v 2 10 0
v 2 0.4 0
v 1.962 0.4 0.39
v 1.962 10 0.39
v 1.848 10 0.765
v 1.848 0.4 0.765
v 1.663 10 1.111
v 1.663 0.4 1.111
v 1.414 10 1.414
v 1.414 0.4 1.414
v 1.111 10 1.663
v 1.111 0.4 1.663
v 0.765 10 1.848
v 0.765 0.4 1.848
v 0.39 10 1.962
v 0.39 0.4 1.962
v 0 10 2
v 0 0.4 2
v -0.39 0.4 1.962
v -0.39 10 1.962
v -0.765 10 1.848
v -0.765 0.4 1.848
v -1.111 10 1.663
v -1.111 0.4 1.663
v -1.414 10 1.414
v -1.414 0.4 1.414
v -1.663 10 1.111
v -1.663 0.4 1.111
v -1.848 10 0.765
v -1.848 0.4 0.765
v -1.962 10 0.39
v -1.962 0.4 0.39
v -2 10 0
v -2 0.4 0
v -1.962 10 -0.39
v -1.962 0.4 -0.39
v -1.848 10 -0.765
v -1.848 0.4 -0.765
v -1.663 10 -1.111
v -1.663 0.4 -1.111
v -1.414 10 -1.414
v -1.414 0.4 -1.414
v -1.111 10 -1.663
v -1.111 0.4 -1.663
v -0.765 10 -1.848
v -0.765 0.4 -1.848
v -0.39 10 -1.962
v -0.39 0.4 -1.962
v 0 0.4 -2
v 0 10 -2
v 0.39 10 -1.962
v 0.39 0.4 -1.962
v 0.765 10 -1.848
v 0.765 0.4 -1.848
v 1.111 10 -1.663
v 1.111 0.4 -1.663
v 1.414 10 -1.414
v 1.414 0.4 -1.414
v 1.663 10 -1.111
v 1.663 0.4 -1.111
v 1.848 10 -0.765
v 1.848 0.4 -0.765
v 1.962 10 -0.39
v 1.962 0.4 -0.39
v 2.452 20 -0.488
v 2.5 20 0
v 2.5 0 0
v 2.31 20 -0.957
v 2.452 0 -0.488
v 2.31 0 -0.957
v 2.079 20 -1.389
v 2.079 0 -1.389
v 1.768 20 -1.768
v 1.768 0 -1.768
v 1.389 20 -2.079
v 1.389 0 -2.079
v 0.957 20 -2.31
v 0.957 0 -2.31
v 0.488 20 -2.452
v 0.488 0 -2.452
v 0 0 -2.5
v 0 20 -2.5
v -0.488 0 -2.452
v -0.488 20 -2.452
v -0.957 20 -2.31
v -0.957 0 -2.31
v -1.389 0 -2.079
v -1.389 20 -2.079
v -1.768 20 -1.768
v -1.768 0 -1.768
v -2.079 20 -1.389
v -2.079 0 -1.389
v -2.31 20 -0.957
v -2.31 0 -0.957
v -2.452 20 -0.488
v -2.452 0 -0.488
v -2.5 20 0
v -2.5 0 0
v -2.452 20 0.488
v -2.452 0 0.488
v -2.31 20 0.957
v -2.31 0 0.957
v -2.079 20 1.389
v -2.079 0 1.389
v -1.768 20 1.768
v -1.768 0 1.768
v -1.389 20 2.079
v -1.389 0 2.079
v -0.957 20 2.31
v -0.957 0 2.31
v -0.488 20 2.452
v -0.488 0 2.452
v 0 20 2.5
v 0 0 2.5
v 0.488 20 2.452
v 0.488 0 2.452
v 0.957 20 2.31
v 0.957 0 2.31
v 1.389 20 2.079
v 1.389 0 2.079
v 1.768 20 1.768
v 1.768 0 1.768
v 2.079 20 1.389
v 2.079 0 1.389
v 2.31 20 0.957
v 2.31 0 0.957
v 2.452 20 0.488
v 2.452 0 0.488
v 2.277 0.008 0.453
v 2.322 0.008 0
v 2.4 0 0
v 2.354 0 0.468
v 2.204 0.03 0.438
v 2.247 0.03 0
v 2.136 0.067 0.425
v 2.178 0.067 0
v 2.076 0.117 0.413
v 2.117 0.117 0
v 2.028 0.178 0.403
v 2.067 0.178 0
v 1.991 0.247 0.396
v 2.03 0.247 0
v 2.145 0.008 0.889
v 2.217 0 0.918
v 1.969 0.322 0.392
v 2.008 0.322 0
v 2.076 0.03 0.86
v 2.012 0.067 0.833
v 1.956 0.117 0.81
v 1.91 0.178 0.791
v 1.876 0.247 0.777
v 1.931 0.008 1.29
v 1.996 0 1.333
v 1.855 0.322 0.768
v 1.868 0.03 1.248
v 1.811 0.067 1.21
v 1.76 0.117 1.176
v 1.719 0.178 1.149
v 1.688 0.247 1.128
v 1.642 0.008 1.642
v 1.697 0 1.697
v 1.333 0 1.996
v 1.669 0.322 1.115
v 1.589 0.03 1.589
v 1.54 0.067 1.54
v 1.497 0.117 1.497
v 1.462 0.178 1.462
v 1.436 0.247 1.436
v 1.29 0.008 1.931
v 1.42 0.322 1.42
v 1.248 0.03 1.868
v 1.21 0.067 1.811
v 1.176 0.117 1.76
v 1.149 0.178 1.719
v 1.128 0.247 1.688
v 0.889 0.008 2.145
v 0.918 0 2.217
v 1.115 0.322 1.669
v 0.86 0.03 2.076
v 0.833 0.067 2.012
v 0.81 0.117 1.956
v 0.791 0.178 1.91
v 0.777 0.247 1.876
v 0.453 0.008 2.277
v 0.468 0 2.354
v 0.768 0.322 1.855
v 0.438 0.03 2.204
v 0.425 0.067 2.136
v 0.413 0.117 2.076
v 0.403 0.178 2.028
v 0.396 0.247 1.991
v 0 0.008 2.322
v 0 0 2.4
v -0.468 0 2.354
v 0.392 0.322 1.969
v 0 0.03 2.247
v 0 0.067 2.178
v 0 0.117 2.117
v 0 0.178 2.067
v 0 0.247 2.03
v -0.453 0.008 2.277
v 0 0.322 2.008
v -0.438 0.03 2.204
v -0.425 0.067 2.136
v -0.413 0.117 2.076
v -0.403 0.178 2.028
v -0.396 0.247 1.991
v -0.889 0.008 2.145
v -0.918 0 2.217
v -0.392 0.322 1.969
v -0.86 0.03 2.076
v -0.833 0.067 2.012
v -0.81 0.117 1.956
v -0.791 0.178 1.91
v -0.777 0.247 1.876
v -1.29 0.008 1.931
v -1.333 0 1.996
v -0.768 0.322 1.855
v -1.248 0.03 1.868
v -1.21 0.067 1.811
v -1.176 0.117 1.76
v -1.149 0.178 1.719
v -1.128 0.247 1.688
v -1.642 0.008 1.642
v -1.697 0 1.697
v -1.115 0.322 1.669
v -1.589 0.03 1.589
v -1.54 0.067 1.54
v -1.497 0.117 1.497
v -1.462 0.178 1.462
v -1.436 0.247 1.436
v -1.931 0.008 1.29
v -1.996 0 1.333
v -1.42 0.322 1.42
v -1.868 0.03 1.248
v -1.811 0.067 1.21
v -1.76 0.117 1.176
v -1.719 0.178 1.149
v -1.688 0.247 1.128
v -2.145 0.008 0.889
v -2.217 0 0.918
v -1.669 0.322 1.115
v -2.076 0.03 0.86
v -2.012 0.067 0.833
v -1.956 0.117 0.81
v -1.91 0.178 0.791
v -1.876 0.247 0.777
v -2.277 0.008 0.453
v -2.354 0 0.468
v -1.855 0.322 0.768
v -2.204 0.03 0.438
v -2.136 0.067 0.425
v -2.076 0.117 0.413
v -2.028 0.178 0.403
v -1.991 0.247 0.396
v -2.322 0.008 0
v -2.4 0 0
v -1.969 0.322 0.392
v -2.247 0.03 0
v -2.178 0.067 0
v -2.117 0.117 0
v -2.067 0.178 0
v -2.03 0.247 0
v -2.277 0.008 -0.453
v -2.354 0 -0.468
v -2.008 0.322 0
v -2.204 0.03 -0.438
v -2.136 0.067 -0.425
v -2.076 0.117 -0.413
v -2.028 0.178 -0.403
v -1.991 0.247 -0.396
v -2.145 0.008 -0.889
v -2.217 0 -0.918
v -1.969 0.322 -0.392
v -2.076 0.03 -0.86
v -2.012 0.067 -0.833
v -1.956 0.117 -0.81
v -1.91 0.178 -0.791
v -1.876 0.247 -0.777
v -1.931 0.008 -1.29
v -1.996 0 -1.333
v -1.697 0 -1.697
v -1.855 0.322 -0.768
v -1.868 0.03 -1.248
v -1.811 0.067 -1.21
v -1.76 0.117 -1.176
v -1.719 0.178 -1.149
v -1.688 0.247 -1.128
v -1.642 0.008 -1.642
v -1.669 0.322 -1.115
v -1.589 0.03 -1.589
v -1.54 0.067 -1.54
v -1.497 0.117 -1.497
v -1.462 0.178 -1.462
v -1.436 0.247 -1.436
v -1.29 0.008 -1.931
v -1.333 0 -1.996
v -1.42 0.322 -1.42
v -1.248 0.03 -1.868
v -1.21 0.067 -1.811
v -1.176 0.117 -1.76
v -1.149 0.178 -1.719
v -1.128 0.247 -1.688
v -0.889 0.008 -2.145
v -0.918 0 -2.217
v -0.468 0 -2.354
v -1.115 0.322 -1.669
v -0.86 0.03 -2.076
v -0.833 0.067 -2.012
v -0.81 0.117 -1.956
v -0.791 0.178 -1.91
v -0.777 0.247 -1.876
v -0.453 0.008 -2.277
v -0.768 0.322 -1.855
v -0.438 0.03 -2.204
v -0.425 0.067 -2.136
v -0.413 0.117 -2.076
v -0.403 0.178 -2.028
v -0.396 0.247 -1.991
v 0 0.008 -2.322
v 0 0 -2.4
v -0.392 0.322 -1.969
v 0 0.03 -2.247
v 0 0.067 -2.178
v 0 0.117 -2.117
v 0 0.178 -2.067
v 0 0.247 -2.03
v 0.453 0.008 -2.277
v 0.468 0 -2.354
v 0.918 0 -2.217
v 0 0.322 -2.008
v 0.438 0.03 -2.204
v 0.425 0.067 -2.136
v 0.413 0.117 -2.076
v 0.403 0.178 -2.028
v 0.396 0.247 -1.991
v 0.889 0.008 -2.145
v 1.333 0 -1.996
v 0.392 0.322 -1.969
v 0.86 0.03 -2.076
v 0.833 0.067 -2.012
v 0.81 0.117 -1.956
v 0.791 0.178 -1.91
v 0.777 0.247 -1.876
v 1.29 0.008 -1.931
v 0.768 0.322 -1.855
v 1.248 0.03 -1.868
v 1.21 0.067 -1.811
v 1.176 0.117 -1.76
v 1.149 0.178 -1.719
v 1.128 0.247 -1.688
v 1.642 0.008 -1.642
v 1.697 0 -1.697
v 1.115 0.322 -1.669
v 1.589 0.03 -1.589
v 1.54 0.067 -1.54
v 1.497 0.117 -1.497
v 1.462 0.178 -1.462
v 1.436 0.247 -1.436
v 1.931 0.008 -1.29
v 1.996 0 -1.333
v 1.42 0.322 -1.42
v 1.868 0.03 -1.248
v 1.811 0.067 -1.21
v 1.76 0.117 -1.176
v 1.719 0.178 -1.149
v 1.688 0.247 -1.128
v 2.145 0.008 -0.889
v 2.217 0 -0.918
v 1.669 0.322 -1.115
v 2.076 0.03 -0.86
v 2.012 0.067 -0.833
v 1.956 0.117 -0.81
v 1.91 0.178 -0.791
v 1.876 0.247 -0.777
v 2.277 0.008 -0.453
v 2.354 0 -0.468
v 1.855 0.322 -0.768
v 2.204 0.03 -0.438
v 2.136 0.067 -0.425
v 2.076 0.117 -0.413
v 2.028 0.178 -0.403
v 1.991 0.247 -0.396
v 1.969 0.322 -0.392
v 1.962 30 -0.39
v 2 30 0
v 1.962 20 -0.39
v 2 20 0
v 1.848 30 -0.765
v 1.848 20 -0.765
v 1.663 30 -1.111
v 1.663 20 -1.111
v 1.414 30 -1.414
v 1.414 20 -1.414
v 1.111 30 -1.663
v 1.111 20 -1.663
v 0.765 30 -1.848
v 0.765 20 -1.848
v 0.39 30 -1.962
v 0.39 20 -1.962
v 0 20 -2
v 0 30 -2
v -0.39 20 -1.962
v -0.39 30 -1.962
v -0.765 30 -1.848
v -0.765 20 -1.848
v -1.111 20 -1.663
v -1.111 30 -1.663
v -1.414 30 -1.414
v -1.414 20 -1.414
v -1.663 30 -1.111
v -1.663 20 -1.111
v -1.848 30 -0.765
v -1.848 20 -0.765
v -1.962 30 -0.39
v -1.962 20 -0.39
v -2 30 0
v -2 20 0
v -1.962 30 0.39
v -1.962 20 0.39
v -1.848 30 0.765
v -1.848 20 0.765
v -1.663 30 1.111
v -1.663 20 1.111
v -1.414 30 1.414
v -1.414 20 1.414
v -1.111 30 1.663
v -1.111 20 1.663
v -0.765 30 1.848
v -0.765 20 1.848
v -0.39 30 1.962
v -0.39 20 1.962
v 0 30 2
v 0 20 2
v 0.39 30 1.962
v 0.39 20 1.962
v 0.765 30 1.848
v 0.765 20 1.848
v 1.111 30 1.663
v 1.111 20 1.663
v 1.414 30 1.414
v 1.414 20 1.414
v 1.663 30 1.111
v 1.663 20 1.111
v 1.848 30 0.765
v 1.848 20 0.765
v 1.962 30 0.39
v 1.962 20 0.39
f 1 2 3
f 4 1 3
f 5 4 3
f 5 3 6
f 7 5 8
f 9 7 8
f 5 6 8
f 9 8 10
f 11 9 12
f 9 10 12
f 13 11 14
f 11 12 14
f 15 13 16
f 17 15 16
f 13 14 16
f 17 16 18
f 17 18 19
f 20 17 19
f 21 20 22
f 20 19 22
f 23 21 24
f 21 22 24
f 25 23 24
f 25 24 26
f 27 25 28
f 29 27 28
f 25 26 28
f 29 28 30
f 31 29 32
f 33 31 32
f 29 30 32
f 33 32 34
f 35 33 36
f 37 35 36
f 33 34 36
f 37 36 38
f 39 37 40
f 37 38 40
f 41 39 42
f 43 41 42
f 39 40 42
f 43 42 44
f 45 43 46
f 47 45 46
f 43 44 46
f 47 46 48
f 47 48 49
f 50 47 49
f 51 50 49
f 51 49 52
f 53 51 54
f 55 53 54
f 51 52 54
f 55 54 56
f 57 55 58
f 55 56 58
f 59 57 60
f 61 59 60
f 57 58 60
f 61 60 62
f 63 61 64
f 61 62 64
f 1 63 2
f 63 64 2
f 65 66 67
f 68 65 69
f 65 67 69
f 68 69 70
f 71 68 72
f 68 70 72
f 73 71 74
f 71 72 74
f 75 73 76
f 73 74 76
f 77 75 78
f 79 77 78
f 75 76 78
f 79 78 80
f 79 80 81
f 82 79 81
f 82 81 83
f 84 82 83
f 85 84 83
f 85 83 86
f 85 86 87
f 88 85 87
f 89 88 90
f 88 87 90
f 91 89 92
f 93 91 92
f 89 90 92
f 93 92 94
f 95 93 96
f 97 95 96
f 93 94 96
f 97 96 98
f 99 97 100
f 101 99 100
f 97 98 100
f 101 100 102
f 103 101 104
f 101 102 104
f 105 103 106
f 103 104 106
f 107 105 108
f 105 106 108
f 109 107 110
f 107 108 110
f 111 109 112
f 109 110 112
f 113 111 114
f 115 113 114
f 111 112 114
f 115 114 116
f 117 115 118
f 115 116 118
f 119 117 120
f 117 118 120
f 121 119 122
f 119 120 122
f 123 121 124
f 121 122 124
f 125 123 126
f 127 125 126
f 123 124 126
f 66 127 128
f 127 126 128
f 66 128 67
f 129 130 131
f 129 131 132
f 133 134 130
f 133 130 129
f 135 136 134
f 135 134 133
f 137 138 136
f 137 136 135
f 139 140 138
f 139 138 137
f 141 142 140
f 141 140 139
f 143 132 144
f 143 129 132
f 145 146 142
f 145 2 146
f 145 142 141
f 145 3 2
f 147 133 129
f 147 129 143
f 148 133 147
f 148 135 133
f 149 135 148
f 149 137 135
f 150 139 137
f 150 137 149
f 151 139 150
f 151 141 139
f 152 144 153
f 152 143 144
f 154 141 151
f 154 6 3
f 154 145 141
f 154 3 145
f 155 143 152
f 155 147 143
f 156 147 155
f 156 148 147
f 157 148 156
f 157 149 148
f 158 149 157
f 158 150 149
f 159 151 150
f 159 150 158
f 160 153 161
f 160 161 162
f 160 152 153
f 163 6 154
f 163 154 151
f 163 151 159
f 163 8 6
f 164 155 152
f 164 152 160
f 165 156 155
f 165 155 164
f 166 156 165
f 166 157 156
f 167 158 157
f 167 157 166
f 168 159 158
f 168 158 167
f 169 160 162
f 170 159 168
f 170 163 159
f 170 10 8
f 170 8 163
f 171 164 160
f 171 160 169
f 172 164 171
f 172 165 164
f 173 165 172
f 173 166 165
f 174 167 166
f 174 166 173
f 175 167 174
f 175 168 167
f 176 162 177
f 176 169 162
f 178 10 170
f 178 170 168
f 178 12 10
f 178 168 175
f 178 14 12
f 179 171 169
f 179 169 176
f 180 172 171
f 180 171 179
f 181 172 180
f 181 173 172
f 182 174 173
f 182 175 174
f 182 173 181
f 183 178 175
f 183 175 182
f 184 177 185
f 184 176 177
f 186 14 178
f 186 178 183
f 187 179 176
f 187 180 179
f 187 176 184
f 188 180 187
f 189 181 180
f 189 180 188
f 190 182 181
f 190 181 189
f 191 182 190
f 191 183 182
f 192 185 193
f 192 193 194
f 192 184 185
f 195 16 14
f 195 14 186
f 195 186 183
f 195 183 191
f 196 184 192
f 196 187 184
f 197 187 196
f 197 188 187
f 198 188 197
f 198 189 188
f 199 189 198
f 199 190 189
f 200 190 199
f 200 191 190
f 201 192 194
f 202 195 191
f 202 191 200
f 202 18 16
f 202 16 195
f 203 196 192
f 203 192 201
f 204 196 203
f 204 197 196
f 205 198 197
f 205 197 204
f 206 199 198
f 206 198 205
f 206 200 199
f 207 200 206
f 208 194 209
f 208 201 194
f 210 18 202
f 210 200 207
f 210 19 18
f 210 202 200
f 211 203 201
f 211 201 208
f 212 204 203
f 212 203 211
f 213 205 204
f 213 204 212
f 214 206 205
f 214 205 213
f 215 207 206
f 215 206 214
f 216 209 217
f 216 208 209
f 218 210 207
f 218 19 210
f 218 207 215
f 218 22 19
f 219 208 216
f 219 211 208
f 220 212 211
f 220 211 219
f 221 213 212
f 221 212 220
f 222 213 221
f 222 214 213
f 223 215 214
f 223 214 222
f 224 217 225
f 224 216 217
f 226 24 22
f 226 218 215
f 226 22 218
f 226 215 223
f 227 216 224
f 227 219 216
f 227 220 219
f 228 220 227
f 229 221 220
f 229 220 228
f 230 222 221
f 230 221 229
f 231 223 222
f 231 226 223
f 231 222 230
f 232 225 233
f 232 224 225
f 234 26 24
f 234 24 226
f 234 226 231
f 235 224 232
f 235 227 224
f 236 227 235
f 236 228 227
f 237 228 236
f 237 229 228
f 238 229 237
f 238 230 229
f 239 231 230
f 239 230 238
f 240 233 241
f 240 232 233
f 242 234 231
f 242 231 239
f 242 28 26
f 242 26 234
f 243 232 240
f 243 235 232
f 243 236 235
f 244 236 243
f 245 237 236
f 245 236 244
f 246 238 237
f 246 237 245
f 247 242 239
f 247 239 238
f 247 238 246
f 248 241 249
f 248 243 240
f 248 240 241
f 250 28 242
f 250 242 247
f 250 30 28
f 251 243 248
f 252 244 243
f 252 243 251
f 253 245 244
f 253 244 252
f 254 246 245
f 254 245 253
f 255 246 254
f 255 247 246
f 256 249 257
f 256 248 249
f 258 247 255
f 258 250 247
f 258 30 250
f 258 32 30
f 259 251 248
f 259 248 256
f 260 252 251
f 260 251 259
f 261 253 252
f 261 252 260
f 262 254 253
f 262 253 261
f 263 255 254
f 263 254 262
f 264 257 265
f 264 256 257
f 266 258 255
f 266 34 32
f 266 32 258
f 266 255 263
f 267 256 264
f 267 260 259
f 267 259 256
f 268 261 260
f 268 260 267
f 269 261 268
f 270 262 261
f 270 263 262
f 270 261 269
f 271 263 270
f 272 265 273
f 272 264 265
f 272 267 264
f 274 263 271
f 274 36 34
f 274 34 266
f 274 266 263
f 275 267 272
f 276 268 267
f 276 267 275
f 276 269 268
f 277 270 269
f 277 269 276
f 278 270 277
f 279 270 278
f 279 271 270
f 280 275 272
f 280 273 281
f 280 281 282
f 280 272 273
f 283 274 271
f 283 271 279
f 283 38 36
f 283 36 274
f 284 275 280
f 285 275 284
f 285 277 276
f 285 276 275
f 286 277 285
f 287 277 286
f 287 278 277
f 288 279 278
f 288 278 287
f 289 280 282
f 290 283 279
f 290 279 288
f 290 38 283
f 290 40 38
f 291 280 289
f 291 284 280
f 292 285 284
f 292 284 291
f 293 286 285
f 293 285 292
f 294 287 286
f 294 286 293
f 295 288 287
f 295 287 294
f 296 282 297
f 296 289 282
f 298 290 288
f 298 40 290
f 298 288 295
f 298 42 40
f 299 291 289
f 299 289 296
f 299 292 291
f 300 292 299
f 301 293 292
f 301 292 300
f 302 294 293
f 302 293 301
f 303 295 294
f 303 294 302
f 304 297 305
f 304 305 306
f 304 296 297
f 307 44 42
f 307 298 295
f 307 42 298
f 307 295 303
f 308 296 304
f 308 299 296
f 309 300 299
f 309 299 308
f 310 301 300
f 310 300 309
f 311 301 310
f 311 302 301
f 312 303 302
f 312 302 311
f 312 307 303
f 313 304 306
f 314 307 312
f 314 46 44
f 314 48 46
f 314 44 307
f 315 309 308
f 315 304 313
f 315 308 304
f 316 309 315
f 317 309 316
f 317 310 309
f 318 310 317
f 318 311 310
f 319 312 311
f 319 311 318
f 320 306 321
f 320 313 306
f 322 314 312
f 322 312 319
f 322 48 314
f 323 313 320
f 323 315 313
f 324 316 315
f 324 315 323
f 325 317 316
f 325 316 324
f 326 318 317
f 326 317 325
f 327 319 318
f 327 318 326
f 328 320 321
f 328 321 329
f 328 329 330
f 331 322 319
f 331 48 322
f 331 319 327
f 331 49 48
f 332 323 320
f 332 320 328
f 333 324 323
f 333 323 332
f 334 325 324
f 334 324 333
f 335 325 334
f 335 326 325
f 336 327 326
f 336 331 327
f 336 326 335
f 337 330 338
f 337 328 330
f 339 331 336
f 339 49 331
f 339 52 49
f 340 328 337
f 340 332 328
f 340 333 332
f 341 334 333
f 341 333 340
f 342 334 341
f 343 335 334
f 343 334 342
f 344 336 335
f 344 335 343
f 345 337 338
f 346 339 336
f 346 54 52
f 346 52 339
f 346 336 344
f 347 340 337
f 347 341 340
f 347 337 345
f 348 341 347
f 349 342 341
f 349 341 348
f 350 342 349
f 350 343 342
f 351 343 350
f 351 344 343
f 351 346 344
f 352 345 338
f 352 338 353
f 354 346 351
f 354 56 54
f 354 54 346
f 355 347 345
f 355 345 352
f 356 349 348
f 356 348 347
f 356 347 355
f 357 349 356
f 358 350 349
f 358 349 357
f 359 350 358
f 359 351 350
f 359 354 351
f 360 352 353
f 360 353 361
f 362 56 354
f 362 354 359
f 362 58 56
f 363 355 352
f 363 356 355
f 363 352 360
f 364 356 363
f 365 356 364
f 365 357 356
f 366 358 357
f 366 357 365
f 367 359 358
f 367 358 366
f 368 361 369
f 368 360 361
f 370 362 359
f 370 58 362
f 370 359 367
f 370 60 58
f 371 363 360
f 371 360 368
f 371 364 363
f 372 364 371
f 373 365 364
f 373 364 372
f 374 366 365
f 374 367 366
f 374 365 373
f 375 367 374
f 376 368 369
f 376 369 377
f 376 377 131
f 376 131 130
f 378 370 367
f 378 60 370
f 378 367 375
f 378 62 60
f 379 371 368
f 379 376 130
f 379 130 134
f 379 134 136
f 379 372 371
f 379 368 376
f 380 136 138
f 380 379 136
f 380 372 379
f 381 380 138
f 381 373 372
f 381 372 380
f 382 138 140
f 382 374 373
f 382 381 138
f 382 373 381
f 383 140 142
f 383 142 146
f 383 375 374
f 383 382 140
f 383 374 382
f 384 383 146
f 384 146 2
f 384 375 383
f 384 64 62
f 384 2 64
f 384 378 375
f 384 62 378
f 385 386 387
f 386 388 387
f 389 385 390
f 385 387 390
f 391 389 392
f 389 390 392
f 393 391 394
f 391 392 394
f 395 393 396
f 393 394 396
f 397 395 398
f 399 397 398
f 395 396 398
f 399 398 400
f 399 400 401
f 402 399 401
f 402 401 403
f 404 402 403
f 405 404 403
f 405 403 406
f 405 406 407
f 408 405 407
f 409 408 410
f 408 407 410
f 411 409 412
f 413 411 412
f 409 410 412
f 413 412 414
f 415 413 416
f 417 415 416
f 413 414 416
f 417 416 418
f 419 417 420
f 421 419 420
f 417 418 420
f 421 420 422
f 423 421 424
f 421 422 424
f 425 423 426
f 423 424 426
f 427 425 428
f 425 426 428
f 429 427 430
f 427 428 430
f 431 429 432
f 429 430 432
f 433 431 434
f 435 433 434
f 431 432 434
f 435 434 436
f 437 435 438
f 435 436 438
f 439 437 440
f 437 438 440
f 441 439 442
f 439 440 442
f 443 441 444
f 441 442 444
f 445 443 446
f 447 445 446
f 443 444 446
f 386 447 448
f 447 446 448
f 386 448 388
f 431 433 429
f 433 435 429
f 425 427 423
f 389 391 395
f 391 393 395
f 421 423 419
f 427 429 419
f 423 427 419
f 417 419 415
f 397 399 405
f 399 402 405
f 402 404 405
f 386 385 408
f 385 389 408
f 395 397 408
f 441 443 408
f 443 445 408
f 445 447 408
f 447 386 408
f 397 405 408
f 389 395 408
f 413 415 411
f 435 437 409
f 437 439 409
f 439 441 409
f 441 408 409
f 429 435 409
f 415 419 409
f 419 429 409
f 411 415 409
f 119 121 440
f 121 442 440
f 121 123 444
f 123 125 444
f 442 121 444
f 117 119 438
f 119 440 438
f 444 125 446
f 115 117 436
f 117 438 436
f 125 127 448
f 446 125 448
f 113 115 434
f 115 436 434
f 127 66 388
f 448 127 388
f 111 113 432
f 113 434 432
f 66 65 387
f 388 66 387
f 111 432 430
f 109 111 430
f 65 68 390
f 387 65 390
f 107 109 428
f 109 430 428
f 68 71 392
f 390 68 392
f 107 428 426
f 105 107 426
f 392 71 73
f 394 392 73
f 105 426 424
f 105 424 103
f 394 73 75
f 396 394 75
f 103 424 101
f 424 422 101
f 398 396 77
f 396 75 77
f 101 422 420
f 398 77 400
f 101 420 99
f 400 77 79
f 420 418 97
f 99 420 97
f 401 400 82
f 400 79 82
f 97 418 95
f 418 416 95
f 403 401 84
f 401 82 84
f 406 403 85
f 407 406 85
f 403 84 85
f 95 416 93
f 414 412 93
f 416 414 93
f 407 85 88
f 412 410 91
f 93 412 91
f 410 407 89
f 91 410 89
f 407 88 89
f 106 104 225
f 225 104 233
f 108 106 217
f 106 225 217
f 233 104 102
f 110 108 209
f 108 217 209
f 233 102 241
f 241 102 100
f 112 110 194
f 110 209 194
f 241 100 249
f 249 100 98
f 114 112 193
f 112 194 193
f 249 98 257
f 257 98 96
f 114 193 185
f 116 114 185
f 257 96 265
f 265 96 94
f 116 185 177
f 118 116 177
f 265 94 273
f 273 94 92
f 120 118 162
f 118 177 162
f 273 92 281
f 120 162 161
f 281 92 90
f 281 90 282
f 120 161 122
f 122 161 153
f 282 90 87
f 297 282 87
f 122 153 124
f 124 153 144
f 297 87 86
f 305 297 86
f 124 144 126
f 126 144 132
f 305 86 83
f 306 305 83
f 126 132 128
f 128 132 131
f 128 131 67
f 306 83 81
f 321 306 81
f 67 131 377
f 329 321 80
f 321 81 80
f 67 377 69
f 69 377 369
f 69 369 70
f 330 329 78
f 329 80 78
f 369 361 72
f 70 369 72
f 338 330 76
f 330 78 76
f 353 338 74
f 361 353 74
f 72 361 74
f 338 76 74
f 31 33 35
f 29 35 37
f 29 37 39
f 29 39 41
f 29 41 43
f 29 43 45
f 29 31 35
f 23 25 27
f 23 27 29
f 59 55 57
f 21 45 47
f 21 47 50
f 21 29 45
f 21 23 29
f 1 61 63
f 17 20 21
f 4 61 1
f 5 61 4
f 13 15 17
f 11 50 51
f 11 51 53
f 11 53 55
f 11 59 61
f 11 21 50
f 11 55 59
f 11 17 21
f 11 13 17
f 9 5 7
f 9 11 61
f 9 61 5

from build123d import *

# Parameters (mm, degrees)
IZIM2_R               = 2
KES_EKSTR_ZYON1_DEPTH = 10
RADYUS1_R             = 0.4


with BuildPart() as part:
    # Çizim1 → Döndür1 (revolve)
    with BuildSketch(Plane.XY):
        Polygon((0, 0), (0, 30), (2, 30), (2, 20), (2.5, 20), (2.5, 0), align=None)
    revolve(axis=Axis((0, 0, 0), (0, 1, 0)))

    # Çizim2 → Kes-Ekstrüzyon1 (cut)
    with BuildSketch(Plane.XZ):
        Circle(IZIM2_R)
    extrude(amount=-KES_EKSTR_ZYON1_DEPTH, mode=Mode.SUBTRACT)

    # Radyus1
    radyus1_edges = [part.edges().sort_by_distance(p)[0] for p in [
        (-2, 0, 0),
    ]]
    fillet(radyus1_edges, radius=RADYUS1_R)


solid = part.part
